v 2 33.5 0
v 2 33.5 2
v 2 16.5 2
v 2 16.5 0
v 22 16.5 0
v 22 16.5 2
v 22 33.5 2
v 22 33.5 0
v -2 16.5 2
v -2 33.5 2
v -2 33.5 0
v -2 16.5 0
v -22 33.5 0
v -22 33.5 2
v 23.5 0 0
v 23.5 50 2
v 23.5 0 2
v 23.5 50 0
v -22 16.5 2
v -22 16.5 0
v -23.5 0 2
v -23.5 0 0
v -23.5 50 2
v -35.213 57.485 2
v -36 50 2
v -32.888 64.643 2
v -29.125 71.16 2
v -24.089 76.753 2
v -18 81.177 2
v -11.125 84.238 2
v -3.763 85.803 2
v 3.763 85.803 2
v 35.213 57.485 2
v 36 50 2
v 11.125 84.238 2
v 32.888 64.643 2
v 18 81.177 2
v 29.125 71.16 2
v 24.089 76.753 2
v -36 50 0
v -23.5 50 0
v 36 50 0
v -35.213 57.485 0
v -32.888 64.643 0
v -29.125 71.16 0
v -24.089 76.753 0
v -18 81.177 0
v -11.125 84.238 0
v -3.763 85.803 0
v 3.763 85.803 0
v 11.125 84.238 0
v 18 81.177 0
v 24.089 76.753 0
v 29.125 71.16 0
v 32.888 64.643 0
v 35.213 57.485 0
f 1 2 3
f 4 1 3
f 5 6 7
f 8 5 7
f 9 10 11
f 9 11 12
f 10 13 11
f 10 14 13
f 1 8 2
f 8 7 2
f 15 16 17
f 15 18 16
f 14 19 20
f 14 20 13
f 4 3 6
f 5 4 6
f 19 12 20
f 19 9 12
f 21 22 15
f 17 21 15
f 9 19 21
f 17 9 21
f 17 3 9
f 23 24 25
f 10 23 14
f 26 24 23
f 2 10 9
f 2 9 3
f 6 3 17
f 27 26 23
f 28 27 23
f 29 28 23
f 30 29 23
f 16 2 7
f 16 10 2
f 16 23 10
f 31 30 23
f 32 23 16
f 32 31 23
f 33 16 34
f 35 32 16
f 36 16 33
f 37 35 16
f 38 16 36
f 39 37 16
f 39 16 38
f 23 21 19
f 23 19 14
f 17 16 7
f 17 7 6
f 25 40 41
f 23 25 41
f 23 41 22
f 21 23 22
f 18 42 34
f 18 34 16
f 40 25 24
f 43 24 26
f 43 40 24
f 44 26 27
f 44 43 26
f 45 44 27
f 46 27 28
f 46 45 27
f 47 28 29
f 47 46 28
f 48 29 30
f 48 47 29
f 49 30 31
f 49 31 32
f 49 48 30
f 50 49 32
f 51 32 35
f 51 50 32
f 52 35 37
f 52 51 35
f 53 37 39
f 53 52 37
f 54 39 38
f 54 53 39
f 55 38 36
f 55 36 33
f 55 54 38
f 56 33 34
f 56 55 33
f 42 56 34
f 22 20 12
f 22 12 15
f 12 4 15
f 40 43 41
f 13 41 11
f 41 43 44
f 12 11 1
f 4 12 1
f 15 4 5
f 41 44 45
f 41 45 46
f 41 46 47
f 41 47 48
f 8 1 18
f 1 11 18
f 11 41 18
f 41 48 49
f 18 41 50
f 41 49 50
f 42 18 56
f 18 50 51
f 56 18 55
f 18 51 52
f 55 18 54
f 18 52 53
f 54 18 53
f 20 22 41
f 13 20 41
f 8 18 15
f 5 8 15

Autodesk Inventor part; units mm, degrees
ref_plane "YZ Plane" through (0, 0, 0) normal (1, 0, 0) x (0, 1, 0)
ref_plane "XZ Plane" through (0, 0, 0) normal (0, 1, 0) x (-1, 0, 0)
ref_plane "XY Plane" through (0, 0, 0) normal (0, 0, 1) x (1, 0, 0)
sketch "Sketch1" plane through (0, 0, 0) normal (0, 0, 1) x (1, 0, 0)
  line L0 (-36, 50) -> (-23.5, 50)
  line L1 (-23.5, 50) -> (-23.5, 0)
  line L2 (-23.5, 0) -> (0, 0)
  arc A0 (0, 86) -> (-36, 50) centre (0, 50) ccw
  line L3 (0, 0) -> (0, 227.422)
  line L4 (0, 50) -> (-63.2946, 50) construction
  line L5 (36, 50) -> (23.5, 50)
  line L6 (23.5, 50) -> (23.5, 0)
  line L7 (23.5, 0) -> (0, 0)
  arc A1 (36, 50) -> (0, 86) centre (0, 50) ccw
  point P0 (0, 0)
  dimension "d4" = 36
  dimension "d5" = 50
  dimension "d6" = 47
extrude "Micromouse1.2.kicad_pcb_Outline" add sketch "Sketch1" along normal blind 2
sketch "Sketch3" plane through (0, 0, 2) normal (0, 0, 1) x (1, 0, 0)
  line L0 (-23.5, 0) -> (23.5, 0) projected
  line L1 (23.5, 0) -> (23.5, 50) projected
  line L2 (23.5, 50) -> (36, 50) projected
  arc A0 (36, 50) -> (-36, 50) centre (0, 50) ccw projected
  line L3 (-36, 50) -> (-23.5, 50) projected
  line L4 (-23.5, 50) -> (-23.5, 0) projected
  line L5 (-57.2581, 25) -> (65.9372, 25)
  line L6 (0, 50) -> (0, -46.1681)
  line L7 (-22, 33.5) -> (-2, 33.5)
  line L8 (-2, 33.5) -> (-2, 16.5)
  line L9 (-2, 16.5) -> (-22, 16.5)
  line L10 (-22, 16.5) -> (-22, 33.5)
  line L11 (22, 33.5) -> (2, 33.5)
  line L12 (2, 33.5) -> (2, 16.5)
  line L13 (2, 16.5) -> (22, 16.5)
  line L14 (22, 16.5) -> (22, 33.5)
  point P0 (0, 0)
  point P1 (-30, 25)
  point P2 (-2, 25)
  dimension "d7" = 25
  dimension "d8" = 17
  dimension "d9" = 20
  dimension "d10" = 4
extrude "Extrusion3" cut sketch "Sketch3" against normal through all contours L10 L7 L8 L5 | L5 L8 L9 L10 | L12 L11 L14 L5 | L5 L14 L13 L12
sketch "Sketch4" plane through (0, 0, 2) normal (0, 0, 1) x (1, 0, 0)
  line L0 (-22, 16.5) -> (-22, 33.5) projected
  line L1 (-22, 33.5) -> (-2, 33.5) projected
  line L2 (-2, 33.5) -> (-2, 16.5) projected
  line L3 (-2, 16.5) -> (-22, 16.5) projected
  line L4 (22, 33.5) -> (22, 16.5) projected
  line L5 (22, 16.5) -> (2, 16.5) projected
  line L6 (2, 16.5) -> (2, 33.5) projected
  line L7 (2, 33.5) -> (22, 33.5) projected
  line L8 (-23.5, 0) -> (23.5, 0) projected
  line L9 (23.5, 0) -> (23.5, 50) projected
  line L10 (23.5, 50) -> (36, 50) projected
  arc A0 (36, 50) -> (-36, 50) centre (0, 50) ccw projected
  line L11 (-36, 50) -> (-23.5, 50) projected
  line L12 (-23.5, 50) -> (-23.5, 0) projected
  circle A1 centre (-26, 40) radius 0.5
  line L13 (0, 50) -> (0, -21.7733)
  line L14 (-26, 40) -> (-26, -11.7525) construction
  line L15 (-22, 16.5) -> (-22, 33.5) projected
  line L16 (-22, 25) -> (-54.7599, 25)
  circle A2 centre (-26, 10) radius 0.5
  circle A3 centre (26, 40) radius 0.5
  circle A4 centre (26, 10) radius 0.5
  point P0 (0, 0)
  dimension "d13" = 1
  dimension "d14" = 52
  dimension "d17" = 30
extrude "Extrusion4" cut sketch "Sketch4" against normal through all contours A1 | A2 | A3 | A4
hole "Hole1" [suppressed]
hole "Hole2" [suppressed]
hole "Hole3" [suppressed]
hole "Hole4" [suppressed]
properties part number "Micromouse_pcb"
